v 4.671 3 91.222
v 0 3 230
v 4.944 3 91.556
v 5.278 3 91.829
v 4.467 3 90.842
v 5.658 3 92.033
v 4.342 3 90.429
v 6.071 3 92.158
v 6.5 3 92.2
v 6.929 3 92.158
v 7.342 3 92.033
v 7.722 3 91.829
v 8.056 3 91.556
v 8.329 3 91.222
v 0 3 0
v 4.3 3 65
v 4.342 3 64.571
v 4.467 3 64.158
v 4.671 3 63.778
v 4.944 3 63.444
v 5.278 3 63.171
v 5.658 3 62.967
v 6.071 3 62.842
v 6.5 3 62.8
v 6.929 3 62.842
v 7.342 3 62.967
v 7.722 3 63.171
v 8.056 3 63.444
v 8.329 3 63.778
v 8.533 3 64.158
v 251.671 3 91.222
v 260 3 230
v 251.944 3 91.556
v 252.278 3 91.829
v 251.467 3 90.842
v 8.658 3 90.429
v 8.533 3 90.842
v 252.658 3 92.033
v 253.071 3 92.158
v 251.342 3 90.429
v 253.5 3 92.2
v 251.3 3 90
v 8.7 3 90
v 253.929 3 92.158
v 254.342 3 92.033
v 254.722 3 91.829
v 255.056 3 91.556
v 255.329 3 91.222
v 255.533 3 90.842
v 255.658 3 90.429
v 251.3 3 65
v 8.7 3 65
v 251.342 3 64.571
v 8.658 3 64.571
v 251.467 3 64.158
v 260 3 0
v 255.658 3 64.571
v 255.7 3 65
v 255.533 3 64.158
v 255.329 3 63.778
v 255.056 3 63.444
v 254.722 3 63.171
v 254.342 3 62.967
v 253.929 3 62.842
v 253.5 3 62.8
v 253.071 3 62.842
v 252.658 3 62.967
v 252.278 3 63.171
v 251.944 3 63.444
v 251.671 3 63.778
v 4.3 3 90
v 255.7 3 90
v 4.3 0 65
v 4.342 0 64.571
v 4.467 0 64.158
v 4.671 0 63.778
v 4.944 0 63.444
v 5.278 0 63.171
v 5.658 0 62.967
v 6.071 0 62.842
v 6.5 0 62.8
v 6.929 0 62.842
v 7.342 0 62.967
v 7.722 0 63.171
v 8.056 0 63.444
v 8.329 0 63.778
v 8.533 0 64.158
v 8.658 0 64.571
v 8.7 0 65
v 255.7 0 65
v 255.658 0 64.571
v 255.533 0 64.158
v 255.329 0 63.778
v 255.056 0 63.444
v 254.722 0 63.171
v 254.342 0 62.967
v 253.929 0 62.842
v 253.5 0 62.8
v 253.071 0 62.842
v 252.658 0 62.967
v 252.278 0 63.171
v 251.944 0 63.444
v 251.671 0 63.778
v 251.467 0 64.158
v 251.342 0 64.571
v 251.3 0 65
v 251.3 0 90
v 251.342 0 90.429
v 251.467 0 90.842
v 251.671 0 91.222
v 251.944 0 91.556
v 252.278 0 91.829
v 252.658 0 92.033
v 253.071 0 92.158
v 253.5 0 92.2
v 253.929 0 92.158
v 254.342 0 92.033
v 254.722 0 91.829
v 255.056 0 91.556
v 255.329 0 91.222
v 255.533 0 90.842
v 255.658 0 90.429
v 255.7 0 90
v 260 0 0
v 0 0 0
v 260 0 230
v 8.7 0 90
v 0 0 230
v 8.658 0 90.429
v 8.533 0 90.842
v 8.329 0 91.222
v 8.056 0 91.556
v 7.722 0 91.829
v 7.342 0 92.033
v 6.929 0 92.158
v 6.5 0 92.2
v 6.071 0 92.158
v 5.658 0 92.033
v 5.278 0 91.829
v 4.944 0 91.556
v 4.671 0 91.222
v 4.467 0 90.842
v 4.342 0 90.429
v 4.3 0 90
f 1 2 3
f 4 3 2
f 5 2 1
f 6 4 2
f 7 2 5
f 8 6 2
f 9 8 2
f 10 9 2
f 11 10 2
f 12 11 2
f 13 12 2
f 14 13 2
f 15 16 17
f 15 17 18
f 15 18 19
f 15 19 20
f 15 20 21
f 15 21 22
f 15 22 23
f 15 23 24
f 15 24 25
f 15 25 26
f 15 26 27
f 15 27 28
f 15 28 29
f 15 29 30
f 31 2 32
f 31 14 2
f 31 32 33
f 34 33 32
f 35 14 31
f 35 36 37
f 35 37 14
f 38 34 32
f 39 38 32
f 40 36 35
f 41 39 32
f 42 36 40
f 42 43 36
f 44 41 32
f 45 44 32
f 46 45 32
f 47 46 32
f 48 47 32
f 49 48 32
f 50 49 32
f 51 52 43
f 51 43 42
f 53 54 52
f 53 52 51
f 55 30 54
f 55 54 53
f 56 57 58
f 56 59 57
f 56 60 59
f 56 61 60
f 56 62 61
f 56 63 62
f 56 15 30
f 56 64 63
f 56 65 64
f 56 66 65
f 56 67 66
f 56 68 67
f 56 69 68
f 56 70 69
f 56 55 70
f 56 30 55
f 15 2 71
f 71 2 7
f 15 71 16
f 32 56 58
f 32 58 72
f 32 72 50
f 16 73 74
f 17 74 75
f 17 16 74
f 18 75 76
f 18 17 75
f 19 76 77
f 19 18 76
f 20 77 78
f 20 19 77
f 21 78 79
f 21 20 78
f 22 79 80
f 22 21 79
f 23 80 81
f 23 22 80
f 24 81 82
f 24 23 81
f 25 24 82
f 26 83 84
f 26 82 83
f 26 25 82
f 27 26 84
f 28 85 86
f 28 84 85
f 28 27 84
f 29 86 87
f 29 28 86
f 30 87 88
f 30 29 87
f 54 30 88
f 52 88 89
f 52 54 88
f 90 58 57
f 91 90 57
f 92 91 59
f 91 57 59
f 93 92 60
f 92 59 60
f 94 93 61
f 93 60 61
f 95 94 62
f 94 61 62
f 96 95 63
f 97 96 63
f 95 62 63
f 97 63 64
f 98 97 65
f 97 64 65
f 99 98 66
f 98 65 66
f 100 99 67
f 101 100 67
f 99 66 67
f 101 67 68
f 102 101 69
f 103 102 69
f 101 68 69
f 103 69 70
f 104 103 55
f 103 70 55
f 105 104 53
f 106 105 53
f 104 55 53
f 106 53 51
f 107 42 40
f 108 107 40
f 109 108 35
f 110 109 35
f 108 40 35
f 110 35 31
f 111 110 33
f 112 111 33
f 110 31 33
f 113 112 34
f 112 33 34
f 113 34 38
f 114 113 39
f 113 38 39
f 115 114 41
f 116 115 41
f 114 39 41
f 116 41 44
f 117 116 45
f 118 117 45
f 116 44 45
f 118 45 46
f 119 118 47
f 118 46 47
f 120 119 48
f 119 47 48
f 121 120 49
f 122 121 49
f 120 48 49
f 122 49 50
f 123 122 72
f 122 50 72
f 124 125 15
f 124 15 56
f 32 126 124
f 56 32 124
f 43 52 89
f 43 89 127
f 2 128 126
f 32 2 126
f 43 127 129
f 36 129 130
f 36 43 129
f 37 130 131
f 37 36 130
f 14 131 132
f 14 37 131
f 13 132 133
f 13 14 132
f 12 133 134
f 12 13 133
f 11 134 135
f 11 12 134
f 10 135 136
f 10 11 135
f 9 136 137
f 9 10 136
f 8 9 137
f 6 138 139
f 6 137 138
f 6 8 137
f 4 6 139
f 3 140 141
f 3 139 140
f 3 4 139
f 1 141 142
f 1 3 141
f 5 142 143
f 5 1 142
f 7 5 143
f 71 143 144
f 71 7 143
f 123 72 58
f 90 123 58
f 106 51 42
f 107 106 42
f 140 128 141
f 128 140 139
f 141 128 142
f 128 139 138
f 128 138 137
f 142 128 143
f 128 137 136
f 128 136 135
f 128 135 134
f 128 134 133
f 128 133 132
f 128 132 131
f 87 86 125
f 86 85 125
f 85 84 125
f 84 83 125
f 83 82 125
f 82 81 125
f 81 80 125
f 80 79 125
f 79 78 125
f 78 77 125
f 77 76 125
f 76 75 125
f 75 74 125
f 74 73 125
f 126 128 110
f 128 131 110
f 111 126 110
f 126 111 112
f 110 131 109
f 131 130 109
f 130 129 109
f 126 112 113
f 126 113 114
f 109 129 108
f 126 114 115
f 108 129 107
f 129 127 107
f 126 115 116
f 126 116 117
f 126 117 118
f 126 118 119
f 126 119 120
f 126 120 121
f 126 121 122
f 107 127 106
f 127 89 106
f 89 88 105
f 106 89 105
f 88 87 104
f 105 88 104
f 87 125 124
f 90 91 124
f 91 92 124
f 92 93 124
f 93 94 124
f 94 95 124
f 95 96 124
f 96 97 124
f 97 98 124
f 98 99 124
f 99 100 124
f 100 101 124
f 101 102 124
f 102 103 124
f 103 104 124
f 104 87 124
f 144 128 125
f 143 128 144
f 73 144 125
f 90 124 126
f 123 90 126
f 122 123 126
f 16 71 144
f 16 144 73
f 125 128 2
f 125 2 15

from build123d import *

# Parameters (mm, degrees)
SKETCH1_W           = 260
SKETCH1_H           = 230
BOSS_EXTRUDE1_DEPTH = 3
CUT_EXTRUDE1_DEPTH  = 348.144062314


with BuildPart() as part:
    # Sketch1 → Boss-Extrude1 (new body)
    with BuildSketch(Plane(origin=(0, 0, 0), x_dir=(1, 0, 0), z_dir=(0, 1, 0))):
        with Locations((130, -115)):
            Rectangle(SKETCH1_W, SKETCH1_H)
    extrude(amount=BOSS_EXTRUDE1_DEPTH)

    # Sketch2 → Cut-Extrude1 (cut, through all)
    with BuildSketch(Plane(origin=(0, 3, 0), x_dir=(1, 0, 0), z_dir=(0, 1, 0))):
        with BuildLine():
            Line((8.7, -65), (8.7, -90))
            ThreePointArc((8.7, -90), (6.5, -92.2), (4.3, -90))
            Line((4.3, -90), (4.3, -65))
            ThreePointArc((4.3, -65), (6.5, -62.8), (8.7, -65))
        make_face()
        with BuildLine():
            Line((251.3, -65), (251.3, -90))
            ThreePointArc((251.3, -90), (253.5, -92.2), (255.7, -90))
            Line((255.7, -90), (255.7, -65))
            ThreePointArc((255.7, -65), (253.5, -62.8), (251.3, -65))
        make_face()
    extrude(amount=-CUT_EXTRUDE1_DEPTH, mode=Mode.SUBTRACT)


solid = part.part
